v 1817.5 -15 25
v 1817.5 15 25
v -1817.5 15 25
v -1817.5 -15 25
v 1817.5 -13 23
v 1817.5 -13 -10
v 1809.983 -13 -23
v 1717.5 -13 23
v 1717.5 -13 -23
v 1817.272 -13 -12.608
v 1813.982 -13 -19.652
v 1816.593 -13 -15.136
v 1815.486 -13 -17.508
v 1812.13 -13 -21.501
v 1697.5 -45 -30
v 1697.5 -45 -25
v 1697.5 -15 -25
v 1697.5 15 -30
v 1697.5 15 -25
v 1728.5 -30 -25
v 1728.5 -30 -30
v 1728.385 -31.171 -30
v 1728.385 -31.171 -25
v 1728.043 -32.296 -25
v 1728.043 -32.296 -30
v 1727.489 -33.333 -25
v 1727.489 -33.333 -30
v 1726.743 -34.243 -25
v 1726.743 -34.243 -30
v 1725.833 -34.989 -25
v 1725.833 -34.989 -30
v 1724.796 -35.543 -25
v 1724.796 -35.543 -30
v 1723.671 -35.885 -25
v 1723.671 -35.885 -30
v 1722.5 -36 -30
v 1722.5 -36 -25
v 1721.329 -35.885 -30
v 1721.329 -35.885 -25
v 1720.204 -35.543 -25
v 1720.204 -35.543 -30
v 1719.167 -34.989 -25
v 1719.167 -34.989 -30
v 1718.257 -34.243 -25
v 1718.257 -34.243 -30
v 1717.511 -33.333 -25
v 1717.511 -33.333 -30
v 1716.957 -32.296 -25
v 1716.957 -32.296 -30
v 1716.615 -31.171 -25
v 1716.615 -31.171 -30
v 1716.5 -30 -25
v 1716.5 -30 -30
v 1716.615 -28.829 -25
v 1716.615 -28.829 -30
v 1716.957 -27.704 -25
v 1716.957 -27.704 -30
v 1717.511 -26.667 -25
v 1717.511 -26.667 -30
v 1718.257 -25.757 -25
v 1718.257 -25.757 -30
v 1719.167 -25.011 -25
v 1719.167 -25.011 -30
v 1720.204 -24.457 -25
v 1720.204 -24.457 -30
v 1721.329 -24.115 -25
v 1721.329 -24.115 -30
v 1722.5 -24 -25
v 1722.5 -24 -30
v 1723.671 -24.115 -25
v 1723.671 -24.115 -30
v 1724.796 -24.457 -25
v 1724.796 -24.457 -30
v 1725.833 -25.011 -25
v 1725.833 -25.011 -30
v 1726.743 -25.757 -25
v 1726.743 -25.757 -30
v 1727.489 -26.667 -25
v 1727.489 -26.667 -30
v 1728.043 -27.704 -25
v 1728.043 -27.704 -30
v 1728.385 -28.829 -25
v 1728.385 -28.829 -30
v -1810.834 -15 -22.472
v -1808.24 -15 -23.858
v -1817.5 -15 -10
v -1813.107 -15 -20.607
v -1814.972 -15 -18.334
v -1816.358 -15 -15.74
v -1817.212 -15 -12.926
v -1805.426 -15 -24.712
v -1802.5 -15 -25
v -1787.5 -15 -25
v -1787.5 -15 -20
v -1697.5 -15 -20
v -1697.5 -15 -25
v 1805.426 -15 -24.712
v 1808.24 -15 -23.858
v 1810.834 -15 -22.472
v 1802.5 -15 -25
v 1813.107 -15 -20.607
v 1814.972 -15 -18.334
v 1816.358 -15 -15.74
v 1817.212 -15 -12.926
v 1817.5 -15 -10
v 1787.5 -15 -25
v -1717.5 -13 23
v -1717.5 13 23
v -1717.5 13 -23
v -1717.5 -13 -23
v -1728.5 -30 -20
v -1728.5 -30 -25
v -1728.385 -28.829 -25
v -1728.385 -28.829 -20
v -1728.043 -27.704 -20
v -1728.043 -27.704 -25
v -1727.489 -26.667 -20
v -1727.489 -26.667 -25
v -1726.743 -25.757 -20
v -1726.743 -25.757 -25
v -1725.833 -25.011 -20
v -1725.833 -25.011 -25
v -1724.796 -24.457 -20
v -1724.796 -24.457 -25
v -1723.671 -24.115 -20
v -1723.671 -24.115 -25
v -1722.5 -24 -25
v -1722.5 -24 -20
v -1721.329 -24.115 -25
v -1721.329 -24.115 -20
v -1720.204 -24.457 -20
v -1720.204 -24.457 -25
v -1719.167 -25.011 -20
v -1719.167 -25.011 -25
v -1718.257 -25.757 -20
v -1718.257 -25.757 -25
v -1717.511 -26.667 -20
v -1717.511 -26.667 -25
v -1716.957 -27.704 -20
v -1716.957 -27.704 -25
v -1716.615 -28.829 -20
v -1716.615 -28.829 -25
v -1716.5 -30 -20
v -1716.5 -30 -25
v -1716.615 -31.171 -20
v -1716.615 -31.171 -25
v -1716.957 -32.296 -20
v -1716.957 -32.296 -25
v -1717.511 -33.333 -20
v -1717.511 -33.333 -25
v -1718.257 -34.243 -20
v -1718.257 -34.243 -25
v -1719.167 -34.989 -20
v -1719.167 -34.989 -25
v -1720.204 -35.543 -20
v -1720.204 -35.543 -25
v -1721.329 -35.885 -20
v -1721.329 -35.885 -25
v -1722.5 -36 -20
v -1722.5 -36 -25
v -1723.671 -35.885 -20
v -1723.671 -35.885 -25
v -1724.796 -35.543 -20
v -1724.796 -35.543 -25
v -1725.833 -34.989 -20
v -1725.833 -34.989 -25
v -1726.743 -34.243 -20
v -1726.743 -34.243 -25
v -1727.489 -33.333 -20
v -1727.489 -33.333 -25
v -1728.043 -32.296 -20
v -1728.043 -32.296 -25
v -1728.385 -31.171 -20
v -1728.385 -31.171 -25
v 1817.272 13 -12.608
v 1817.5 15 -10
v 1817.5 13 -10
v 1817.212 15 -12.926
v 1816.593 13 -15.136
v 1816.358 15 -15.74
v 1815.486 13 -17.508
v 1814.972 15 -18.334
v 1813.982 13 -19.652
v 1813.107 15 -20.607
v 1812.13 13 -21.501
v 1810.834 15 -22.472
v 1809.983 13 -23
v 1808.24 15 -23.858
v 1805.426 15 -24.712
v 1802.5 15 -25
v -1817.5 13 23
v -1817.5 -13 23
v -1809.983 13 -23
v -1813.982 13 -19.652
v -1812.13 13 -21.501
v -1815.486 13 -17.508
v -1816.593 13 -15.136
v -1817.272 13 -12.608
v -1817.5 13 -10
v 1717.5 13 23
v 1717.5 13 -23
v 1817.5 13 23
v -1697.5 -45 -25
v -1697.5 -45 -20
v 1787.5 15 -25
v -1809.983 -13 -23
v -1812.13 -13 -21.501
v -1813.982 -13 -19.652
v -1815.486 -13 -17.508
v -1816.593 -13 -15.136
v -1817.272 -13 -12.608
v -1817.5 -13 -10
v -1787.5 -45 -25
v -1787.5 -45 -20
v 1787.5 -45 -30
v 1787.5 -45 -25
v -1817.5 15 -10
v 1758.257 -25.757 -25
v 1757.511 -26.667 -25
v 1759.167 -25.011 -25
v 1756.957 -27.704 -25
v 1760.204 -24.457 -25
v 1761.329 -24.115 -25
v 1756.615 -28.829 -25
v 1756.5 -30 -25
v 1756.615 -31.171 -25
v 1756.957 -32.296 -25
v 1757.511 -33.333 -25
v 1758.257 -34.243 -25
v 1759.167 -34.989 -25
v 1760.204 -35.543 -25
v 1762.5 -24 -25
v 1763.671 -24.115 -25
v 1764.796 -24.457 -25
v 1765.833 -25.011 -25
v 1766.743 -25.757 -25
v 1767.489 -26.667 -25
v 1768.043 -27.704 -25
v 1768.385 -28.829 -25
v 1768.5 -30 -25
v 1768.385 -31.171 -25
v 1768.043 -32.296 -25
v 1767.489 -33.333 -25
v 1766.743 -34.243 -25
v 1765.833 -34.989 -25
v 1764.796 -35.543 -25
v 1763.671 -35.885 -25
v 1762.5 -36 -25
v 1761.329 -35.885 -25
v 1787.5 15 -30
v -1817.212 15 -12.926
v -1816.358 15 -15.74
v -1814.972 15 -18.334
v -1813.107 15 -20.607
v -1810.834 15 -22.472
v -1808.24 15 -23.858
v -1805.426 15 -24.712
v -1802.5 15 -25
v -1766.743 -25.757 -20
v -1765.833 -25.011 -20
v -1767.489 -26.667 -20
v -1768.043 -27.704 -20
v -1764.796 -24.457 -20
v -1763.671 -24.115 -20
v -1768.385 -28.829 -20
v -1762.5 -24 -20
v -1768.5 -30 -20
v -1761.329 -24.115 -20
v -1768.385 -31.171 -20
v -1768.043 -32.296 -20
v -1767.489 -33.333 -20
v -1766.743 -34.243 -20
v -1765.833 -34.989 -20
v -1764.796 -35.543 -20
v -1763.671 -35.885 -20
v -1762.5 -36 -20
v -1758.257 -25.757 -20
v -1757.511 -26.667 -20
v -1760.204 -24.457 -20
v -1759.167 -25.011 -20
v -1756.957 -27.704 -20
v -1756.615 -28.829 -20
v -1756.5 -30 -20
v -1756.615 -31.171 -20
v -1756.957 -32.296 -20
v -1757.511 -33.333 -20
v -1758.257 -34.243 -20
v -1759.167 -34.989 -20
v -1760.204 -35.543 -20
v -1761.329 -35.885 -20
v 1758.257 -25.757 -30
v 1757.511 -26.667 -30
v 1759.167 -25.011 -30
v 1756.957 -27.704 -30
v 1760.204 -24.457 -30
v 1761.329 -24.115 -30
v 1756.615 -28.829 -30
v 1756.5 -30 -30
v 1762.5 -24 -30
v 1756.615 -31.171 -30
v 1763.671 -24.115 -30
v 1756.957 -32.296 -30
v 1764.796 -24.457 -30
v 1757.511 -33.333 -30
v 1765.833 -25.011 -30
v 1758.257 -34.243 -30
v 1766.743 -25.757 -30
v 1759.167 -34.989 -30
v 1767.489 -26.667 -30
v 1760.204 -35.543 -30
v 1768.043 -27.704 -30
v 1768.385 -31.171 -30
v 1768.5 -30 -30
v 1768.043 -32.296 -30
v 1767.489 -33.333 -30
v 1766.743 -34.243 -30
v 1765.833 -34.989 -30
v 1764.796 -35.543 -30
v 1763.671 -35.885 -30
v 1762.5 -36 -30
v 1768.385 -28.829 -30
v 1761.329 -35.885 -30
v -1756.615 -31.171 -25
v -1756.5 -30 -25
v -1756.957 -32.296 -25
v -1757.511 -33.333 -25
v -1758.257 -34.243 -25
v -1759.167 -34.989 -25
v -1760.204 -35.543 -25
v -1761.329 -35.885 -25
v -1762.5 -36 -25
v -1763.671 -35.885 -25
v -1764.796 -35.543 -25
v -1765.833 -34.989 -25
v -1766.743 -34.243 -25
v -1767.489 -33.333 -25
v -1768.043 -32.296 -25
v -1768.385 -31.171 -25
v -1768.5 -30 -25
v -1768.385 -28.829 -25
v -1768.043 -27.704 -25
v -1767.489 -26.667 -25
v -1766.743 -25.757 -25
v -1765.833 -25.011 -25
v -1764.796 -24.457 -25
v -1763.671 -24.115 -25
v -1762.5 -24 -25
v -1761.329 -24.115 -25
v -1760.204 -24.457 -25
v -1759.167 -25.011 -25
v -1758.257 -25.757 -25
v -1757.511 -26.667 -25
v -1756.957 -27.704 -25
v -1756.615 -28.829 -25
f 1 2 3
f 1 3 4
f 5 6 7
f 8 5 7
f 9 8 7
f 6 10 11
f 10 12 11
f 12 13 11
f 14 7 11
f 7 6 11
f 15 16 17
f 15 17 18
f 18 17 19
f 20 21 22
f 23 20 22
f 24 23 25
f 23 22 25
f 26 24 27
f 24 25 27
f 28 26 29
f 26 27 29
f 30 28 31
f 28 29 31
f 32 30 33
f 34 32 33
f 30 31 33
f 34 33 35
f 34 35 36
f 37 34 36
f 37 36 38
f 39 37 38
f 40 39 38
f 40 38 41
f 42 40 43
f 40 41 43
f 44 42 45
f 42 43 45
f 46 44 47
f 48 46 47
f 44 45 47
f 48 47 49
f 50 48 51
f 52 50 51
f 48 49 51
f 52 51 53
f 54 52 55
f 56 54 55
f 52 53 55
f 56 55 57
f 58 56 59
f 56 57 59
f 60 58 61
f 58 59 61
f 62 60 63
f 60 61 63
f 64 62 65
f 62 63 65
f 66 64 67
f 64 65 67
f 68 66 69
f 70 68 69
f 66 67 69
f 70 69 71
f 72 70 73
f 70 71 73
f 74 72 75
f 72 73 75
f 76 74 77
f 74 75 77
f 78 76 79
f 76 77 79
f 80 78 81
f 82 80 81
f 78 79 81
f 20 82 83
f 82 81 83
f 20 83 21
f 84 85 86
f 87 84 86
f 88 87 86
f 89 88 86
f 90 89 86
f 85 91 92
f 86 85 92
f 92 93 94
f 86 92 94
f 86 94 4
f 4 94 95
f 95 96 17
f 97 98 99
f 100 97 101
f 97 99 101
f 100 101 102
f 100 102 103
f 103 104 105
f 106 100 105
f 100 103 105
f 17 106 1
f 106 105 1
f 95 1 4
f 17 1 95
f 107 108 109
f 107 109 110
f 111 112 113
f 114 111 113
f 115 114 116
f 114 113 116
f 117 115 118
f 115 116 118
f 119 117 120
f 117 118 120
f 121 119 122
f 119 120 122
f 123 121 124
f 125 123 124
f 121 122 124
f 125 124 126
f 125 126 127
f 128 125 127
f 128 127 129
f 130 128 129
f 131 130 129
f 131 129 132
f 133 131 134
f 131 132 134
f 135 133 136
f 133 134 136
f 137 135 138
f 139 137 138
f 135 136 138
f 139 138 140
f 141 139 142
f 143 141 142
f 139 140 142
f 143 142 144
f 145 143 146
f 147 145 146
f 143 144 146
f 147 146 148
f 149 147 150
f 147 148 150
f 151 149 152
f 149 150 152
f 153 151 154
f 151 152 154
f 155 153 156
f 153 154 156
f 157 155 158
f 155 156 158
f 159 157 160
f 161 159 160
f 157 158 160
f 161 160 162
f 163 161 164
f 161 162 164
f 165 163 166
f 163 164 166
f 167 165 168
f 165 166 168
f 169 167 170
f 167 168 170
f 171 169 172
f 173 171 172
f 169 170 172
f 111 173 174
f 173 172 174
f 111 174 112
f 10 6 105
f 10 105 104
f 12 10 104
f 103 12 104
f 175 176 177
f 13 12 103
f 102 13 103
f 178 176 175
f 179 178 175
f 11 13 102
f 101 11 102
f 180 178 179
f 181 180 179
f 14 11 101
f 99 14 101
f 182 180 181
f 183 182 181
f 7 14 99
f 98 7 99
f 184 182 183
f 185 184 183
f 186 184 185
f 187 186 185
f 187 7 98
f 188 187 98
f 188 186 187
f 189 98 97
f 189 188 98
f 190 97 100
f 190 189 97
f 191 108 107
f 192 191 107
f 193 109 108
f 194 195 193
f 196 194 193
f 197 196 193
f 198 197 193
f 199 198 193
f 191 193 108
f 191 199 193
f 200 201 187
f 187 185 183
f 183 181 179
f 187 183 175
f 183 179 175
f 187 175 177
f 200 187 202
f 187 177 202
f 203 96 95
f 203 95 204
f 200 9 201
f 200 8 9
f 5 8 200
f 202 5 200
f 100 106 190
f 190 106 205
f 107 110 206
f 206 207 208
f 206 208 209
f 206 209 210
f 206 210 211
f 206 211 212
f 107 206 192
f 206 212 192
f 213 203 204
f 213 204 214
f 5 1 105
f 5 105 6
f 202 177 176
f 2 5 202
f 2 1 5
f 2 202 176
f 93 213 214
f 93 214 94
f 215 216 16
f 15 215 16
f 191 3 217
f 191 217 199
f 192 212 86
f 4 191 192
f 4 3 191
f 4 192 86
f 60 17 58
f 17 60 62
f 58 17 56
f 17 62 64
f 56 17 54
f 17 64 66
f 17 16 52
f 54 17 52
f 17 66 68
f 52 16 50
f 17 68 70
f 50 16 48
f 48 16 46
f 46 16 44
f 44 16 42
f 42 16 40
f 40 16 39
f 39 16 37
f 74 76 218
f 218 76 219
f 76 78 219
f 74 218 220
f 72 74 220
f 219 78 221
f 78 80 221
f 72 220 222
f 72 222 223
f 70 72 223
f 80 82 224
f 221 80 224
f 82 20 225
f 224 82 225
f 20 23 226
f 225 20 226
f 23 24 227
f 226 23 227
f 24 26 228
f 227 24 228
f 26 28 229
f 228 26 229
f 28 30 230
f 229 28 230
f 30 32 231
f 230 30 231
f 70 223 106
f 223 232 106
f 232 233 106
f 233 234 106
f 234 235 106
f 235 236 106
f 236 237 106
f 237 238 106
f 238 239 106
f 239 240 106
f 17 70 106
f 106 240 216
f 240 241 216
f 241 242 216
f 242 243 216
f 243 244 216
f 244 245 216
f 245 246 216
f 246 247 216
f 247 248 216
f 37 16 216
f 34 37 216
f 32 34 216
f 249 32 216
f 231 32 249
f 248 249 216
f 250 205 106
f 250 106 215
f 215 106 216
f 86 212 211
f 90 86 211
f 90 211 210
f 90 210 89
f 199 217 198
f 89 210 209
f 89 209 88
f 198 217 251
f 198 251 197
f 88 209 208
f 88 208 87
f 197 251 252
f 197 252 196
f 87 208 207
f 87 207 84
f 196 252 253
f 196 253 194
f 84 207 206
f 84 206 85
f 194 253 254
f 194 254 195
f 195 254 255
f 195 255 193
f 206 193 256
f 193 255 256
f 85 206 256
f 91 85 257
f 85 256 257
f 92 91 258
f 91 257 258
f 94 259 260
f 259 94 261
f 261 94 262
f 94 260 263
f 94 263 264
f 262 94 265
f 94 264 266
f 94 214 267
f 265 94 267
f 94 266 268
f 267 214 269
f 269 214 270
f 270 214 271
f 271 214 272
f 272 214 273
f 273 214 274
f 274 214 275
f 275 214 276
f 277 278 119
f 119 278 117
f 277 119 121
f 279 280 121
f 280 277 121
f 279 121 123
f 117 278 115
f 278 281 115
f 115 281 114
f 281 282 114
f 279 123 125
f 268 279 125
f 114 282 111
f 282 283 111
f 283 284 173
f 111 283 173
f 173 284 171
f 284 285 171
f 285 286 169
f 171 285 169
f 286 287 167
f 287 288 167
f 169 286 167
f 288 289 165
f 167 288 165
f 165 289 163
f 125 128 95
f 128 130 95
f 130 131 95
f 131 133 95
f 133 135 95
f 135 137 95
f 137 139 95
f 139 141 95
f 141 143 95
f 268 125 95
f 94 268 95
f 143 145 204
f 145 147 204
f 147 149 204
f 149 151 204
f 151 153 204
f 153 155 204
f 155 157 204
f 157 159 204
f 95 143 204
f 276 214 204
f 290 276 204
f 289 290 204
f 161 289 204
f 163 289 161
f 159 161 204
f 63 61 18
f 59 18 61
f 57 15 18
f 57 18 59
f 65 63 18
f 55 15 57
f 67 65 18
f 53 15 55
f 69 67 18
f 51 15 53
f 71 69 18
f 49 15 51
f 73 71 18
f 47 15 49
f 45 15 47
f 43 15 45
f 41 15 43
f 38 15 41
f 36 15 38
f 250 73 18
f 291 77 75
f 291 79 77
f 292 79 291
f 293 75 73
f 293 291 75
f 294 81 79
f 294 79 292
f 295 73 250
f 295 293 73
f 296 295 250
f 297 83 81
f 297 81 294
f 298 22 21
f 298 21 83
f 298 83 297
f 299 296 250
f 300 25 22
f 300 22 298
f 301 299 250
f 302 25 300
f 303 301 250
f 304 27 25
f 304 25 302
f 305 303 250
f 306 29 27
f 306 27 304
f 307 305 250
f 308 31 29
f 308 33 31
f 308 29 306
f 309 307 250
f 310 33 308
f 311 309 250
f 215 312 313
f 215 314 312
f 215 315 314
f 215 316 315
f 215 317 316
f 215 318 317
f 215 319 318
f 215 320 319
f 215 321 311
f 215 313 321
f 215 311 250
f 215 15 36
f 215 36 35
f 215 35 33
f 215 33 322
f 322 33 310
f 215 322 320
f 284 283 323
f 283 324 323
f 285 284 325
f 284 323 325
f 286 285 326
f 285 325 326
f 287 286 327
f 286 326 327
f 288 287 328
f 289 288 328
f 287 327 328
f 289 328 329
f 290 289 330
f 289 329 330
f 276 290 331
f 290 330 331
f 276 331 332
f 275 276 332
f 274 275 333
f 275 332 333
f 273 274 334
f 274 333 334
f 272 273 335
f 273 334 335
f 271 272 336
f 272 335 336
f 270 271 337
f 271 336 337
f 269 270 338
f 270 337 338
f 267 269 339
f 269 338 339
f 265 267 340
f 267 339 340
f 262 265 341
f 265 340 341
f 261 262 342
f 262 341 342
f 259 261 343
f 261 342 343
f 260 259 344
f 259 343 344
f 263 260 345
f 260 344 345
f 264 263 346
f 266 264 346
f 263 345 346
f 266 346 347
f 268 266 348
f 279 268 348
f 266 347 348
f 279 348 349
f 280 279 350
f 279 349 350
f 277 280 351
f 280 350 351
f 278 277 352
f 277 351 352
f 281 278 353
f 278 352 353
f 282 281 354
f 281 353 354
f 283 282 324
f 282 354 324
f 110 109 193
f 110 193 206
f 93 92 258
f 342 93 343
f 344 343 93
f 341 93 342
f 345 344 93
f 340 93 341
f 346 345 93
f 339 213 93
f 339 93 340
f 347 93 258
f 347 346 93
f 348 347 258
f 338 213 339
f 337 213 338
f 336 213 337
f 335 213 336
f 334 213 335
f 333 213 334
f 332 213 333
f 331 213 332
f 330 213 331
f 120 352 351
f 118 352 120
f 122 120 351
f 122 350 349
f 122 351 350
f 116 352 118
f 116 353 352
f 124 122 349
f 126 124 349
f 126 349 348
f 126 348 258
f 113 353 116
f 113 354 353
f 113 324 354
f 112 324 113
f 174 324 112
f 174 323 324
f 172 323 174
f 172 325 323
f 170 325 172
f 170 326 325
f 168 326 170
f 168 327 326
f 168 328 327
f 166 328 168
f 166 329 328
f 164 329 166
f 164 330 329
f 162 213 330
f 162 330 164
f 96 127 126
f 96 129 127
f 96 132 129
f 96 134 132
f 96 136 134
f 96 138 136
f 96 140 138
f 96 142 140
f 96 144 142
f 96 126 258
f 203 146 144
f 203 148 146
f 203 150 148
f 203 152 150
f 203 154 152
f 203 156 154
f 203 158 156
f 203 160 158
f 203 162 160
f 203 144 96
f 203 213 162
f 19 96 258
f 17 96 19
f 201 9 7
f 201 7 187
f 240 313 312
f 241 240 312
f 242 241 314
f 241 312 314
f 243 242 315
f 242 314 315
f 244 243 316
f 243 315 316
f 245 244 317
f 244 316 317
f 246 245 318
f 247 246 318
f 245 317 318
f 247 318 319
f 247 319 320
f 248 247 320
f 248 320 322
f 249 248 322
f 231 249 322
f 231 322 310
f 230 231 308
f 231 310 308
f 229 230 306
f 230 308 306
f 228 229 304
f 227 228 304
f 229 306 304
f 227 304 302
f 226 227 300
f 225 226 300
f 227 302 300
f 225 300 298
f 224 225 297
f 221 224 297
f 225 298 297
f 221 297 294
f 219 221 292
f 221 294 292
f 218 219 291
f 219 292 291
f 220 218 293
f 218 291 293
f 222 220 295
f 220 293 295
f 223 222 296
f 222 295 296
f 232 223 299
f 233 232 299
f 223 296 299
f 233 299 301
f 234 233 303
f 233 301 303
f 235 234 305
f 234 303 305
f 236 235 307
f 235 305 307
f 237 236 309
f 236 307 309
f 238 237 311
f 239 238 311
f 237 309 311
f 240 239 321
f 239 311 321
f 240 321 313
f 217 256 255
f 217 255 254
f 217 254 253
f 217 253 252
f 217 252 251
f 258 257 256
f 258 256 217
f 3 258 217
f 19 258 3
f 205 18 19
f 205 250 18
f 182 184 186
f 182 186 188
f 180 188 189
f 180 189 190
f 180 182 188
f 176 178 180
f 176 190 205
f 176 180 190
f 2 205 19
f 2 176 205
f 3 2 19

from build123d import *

# Parameters (mm, degrees)
F0_W          = 3575
F0_H          = 50
F1_DEPTH      = 15
F1_DEPTH_BACK = 15
F3_DEPTH      = 5
F5_DEPTH      = 5
F6_R          = 6
F7_DEPTH      = 5
F8_R          = 6
F9_DEPTH      = 5
F12_DEPTH     = 5
F13_W         = 30
F13_H         = 50
F14_DEPTH     = 30
F15_R         = 15
F16_W         = 26
F16_H         = 13
F16_H_2       = 33
F17_DEPTH     = 100
F18_W         = 30
F18_H         = 50
F19_DEPTH     = 30
F20_W         = 26
F20_H         = 46
F21_DEPTH     = 100
F22_T1_DEPTH  = 105
F23_DEPTH     = 5
F24_DEPTH     = 5


# Not quite as in the source:
# - a fillet or chamfer that OpenCascade refuses, or shapes differently, is made with other operations: its cross-section is extruded or revolved along the edge and cut away or added


with BuildPart() as f1:
    # F0 (on Front) → F1 (new body, two sides)
    with BuildSketch(Plane.XZ) as f1_sk:
        Rectangle(F0_W, F0_H)
    extrude(amount=F1_DEPTH)
    extrude(f1_sk.sketch, amount=-F1_DEPTH_BACK)

    # F2 (on face) → F3 (join)
    with BuildSketch(Plane(origin=(0, 0, -25), x_dir=(1, 0, 0), z_dir=(0, 0, -1))):
        Polygon((-1787.5, 45), (-1787.5, 15), (-1787.5, -15), (-1697.5, -15), (-1697.5, 45), align=None)
    extrude(amount=F3_DEPTH)

    # F4 (on face) → F5 (join)
    with BuildSketch(Plane(origin=(0, 0, -25), x_dir=(1, 0, 0), z_dir=(0, 0, -1))):
        Polygon((1787.5, -15), (1787.5, 15), (1787.5, 45), (1697.5, 45), (1697.5, -15), align=None)
    extrude(amount=F5_DEPTH)

    # F6 (on face) → F7 (cut, through all)
    with BuildSketch(Plane(origin=(0, 0, -30), x_dir=(1, 0, 0), z_dir=(0, 0, -1))):
        with Locations((-935, 30)):
            Circle(F6_R)
        with Locations((-975, 30)):
            Circle(F6_R)
    extrude(amount=-F7_DEPTH, mode=Mode.SUBTRACT)

    # F8 (on face) → F9 (cut, through all)
    with BuildSketch(Plane(origin=(0, 0, -30), x_dir=(1, 0, 0), z_dir=(0, 0, -1))):
        with Locations((1762.5, 30)):
            Circle(F8_R)
        with Locations((1722.5, 30)):
            Circle(F8_R)
    extrude(amount=-F9_DEPTH, mode=Mode.SUBTRACT)

    # F11 (on face) → F12 (cut, through all)
    with BuildSketch(Plane(origin=(0, 0, -30), x_dir=(1, 0, 0), z_dir=(0, 0, -1))):
        with BuildLine():
            ThreePointArc((-1762.5, 36), (-1766.7426406871, 34.2426406871), (-1768.5, 30))
            Line((-1768.5, 30), (-1762.5, 30))
            Line((-1762.5, 30), (-1762.5, 36))
        make_face()
        with BuildLine():
            ThreePointArc((-1716.5, 30), (-1722.5, 36), (-1728.5, 30))
            ThreePointArc((-1728.5, 30), (-1722.5, 24), (-1716.5, 30))
        make_face()
        with BuildLine():
            Line((-1762.5, 30), (-1768.5, 30))
            ThreePointArc((-1768.5, 30), (-1762.5, 24), (-1756.5, 30))
            Line((-1756.5, 30), (-1762.5, 30))
        make_face()
        with BuildLine():
            Line((-1762.5, 36), (-1762.5, 30))
            Line((-1762.5, 30), (-1756.5, 30))
            ThreePointArc((-1756.5, 30), (-1758.2573593129, 34.2426406871), (-1762.5, 36))
        make_face()
    extrude(amount=-F12_DEPTH, mode=Mode.SUBTRACT)

    # F13 (on face) → F14 (join)
    with BuildSketch(Plane.YZ.offset(1787.5)):
        Rectangle(F13_W, F13_H)
    extrude(amount=F14_DEPTH)

    # F15
    f15_edges = [f1.edges().sort_by_distance(p)[0] for p in [
        (1817.5, 0, -25),
    ]]
    fillet(f15_edges, radius=F15_R)

    # F16 (on face) → F17 (cut)
    with BuildSketch(Plane.YZ.offset(1817.5)):
        with Locations((0, -16.5)):
            Rectangle(F16_W, F16_H)
        with Locations((0, 6.5)):
            Rectangle(F16_W, F16_H_2)
    extrude(amount=-F17_DEPTH, mode=Mode.SUBTRACT)

    # F18 (on face) → F19 (join)
    with BuildSketch(Plane(origin=(-1787.5, 0, 0), x_dir=(0, -1, 0), z_dir=(-1, 0, 0))):
        Rectangle(F18_W, F18_H)
    extrude(amount=F19_DEPTH)

    # F20 (on face) → F21 (cut)
    with BuildSketch(Plane(origin=(-1817.5, 0, 0), x_dir=(0, -1, 0), z_dir=(-1, 0, 0))):
        Rectangle(F20_W, F20_H)
    extrude(amount=-F21_DEPTH, mode=Mode.SUBTRACT)

    # F22: fillet of radius 15 on 1 edges, made by hand

    # F22_s2 → F22_t1 (cut)
    with BuildSketch(Plane.XZ.offset(-52.5)):
        with BuildLine():
            ThreePointArc((-1817.5, -10), (-1813.1066017178, -20.6066017178), (-1802.5, -25))
            Line((-1802.5, -25), (-1817.5, -25))
            Line((-1817.5, -25), (-1817.5, -10))
        make_face()
    extrude(amount=F22_T1_DEPTH, mode=Mode.SUBTRACT)

    # F23 (add): a face of the model
    f23_faces = [f1.faces().sort_by_distance(p)[0] for p in [
        (-1742.5, -30, -25),
    ]]
    extrude(f23_faces, amount=F23_DEPTH)

    # F24 (cut): a face of the model
    f24_faces = [f1.faces().sort_by_distance(p)[0] for p in [
        (-1742.5, -14.3442118808, -30),
    ]]
    extrude(f24_faces, amount=-F24_DEPTH, mode=Mode.SUBTRACT)


solid = f1.part
